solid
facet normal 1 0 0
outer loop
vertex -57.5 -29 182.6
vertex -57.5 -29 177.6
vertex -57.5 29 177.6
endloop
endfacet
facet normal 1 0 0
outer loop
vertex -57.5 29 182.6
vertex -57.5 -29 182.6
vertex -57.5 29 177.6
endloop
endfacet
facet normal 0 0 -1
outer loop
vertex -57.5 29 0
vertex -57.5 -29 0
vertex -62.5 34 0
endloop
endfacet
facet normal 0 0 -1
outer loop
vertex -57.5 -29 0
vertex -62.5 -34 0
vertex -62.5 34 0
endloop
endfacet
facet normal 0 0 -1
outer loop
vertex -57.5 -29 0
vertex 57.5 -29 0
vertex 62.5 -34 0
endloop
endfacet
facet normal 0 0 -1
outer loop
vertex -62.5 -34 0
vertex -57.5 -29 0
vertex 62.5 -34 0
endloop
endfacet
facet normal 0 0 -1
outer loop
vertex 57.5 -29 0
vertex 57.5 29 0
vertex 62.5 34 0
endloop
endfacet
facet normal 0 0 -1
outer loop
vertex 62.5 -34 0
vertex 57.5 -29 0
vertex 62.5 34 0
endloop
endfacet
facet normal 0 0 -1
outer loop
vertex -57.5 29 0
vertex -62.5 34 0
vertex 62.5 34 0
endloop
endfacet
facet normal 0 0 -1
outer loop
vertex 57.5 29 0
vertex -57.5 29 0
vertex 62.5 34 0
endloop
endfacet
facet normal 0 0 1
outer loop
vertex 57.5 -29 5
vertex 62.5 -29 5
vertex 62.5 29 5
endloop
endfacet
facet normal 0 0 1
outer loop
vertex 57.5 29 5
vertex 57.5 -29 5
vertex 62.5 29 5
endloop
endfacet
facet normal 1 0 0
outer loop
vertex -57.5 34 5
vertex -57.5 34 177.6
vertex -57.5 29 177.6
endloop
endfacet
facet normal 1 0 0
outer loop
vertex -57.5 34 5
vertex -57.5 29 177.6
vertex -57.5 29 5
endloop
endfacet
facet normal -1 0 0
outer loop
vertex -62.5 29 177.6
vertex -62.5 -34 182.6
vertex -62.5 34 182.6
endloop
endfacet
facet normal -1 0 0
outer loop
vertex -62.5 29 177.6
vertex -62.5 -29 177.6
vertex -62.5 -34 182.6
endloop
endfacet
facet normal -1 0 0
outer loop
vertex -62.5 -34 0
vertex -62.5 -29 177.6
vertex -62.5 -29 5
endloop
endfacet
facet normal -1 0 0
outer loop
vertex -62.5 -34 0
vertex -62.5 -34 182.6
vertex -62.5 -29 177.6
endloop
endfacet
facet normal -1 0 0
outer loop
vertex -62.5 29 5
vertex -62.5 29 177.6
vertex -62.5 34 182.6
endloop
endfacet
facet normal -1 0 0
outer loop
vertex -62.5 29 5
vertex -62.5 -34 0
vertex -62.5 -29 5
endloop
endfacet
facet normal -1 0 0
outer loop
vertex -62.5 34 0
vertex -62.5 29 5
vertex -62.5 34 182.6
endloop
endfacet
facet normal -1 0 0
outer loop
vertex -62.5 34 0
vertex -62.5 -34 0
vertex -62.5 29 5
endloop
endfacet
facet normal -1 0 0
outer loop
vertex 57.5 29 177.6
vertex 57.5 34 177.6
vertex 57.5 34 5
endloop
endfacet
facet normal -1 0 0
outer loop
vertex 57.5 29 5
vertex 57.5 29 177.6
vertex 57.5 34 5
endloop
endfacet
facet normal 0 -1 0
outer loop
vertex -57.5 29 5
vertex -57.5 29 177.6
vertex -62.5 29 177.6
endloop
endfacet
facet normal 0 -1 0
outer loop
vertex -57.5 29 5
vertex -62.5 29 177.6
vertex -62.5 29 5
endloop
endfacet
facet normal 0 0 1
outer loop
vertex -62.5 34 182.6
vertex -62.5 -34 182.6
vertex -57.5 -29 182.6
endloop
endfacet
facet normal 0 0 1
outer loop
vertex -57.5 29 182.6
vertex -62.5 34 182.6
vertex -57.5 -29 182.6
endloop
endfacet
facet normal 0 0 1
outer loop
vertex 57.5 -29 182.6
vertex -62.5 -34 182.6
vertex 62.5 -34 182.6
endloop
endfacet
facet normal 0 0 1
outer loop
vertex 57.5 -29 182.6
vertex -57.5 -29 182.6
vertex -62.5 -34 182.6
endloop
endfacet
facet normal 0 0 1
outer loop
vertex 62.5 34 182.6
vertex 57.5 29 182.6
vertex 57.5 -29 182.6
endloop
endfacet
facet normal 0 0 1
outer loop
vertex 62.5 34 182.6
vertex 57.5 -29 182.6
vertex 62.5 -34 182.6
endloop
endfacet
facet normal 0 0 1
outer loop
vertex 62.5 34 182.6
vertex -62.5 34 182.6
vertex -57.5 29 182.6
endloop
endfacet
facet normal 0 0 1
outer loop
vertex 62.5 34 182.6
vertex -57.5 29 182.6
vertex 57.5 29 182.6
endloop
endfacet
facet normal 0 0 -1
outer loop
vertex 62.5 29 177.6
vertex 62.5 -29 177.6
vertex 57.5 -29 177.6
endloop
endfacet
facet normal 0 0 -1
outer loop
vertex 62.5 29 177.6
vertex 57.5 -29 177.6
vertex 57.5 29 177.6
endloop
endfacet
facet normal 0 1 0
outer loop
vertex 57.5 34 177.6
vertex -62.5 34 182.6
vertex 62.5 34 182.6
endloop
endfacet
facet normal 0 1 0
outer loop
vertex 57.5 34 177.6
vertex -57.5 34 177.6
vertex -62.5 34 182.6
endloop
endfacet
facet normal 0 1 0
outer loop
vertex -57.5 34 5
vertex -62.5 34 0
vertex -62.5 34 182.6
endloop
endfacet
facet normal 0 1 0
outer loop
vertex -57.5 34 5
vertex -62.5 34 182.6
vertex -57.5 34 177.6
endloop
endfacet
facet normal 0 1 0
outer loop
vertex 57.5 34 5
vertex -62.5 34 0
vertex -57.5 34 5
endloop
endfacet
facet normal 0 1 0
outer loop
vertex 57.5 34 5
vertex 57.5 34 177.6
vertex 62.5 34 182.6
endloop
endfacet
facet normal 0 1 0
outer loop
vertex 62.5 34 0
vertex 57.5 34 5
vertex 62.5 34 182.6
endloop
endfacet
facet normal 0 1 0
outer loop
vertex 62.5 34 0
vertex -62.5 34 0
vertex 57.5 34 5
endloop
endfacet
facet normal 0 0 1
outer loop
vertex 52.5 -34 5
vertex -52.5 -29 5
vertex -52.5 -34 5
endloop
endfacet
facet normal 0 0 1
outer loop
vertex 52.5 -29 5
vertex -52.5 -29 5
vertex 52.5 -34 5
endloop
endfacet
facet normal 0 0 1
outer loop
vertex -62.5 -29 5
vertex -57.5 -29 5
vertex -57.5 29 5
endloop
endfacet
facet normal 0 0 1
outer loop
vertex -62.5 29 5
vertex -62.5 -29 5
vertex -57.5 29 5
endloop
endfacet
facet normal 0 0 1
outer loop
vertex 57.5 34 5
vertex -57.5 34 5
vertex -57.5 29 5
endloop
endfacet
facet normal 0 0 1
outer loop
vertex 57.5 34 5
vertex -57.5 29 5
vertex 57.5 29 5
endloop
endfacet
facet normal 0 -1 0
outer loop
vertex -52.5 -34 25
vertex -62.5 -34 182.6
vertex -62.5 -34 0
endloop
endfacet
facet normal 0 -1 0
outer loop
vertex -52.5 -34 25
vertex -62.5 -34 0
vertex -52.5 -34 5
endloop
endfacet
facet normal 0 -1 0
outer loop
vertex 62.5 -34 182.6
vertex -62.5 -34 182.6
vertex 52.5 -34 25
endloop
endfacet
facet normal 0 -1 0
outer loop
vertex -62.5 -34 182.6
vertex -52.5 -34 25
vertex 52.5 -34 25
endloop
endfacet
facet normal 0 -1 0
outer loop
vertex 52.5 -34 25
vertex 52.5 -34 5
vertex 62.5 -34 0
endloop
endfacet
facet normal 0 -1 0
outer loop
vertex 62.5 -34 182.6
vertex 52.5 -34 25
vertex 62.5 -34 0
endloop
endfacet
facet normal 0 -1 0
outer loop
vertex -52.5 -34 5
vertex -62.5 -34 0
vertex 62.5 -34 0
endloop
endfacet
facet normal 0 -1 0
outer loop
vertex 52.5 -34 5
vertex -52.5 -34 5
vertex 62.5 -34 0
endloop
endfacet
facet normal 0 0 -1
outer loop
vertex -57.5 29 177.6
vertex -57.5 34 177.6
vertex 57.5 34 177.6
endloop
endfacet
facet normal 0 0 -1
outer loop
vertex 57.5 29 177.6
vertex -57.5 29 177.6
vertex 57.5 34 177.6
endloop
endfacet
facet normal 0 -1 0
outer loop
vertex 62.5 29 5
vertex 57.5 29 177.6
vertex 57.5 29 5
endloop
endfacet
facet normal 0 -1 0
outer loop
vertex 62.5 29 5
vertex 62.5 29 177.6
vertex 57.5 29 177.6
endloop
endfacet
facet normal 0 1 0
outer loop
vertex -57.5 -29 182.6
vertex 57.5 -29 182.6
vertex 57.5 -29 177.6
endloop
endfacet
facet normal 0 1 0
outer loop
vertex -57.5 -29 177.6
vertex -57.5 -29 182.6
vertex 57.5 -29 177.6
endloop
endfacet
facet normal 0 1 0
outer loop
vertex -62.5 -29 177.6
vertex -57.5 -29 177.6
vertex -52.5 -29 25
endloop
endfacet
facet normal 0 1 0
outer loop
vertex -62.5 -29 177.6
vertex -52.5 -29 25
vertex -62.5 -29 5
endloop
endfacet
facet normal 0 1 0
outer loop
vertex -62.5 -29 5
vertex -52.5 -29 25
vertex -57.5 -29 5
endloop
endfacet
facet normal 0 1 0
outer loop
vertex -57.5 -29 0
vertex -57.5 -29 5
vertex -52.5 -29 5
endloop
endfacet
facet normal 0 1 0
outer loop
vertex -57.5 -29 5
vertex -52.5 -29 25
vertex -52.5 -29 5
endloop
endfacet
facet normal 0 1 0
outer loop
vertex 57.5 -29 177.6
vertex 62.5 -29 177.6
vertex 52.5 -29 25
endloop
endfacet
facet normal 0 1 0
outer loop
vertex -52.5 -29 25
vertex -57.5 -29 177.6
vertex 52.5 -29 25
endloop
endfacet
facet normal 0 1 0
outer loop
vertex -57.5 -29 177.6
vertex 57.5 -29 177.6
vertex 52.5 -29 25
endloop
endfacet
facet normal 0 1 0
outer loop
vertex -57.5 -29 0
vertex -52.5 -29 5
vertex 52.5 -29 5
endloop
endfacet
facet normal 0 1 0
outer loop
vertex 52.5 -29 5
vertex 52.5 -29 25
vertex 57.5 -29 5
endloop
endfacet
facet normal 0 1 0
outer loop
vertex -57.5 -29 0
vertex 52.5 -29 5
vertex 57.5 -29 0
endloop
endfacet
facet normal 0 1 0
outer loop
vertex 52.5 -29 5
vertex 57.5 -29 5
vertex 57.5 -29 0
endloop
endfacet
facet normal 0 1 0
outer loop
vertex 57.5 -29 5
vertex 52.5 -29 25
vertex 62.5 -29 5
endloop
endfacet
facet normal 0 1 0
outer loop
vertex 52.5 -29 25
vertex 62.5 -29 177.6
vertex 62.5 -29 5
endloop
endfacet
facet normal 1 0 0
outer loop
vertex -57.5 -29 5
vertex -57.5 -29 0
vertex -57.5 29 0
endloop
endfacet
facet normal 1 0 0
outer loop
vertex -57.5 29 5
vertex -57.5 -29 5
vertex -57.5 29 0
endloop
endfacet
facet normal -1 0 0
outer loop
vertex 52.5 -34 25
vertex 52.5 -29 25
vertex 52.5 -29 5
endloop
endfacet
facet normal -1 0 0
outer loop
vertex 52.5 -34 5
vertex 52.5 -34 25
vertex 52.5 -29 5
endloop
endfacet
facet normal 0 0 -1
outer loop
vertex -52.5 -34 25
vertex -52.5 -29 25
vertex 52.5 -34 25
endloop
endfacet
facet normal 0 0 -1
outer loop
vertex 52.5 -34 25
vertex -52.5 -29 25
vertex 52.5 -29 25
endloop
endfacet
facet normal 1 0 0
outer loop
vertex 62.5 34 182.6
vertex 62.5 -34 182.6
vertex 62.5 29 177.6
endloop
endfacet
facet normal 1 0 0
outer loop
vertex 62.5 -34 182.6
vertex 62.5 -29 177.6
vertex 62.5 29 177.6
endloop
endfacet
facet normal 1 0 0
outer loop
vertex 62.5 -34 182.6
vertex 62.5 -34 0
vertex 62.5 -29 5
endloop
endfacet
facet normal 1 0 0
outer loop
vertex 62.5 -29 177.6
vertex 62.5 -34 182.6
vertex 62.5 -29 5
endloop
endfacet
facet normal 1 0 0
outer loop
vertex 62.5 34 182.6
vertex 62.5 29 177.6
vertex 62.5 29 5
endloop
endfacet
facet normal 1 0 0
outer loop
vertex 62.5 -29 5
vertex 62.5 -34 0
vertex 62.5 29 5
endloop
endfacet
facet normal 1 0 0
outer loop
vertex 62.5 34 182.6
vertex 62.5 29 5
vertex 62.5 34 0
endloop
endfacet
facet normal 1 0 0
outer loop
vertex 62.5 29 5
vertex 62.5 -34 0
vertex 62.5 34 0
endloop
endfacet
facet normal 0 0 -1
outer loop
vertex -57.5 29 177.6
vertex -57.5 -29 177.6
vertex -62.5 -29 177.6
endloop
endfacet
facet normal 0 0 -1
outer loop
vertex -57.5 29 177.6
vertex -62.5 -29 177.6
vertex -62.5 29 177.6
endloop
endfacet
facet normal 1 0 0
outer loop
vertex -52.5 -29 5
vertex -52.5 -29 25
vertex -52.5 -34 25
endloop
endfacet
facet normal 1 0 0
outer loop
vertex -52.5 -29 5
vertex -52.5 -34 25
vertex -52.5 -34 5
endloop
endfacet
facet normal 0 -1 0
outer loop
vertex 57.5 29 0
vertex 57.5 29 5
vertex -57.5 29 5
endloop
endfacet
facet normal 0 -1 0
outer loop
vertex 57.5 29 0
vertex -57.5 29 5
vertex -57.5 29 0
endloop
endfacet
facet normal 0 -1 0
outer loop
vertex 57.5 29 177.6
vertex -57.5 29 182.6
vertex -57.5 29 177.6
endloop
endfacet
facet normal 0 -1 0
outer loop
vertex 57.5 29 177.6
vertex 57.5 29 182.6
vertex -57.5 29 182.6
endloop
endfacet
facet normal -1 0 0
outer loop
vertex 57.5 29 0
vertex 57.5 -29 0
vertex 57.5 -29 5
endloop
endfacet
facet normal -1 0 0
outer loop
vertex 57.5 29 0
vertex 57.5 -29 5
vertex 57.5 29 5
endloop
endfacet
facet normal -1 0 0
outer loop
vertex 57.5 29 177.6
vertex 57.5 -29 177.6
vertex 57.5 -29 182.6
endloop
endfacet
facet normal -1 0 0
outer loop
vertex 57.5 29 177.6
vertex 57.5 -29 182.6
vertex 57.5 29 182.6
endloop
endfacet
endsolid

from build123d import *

# Parameters (mm, degrees)
SKETCH1_W           = 125
SKETCH1_H           = 68
BOSS_EXTRUDE1_DEPTH = 182.6
SKETCH2_W           = 172.6
SKETCH2_H           = 58
CUT_EXTRUDE1_DEPTH  = 126
SKETCH3_W           = 115
SKETCH3_H           = 58
CUT_EXTRUDE2_DEPTH  = 183.6
SKETCH4_W           = 115
SKETCH4_H           = 172.6
CUT_EXTRUDE3_DEPTH  = 63
SKETCH5_W           = 105
SKETCH5_H           = 20
CUT_EXTRUDE4_DEPTH  = 6


with BuildPart() as part:
    # Sketch1 → Boss-Extrude1 (new body)
    with BuildSketch(Plane.XY):
        Rectangle(SKETCH1_W, SKETCH1_H)
    extrude(amount=BOSS_EXTRUDE1_DEPTH)

    # Sketch2 → Cut-Extrude1 (cut, through all)
    with BuildSketch(Plane(origin=(62.5, 0, 0), x_dir=(0, 0, -1), z_dir=(1, 0, 0))):
        with Locations((-91.3, 0)):
            Rectangle(SKETCH2_W, SKETCH2_H)
    extrude(amount=-CUT_EXTRUDE1_DEPTH, mode=Mode.SUBTRACT)

    # Sketch3 → Cut-Extrude2 (cut, through all)
    with BuildSketch(Plane(origin=(0, 0, 0), x_dir=(-1, 0, 0), z_dir=(0, 0, -1))):
        Rectangle(SKETCH3_W, SKETCH3_H)
    extrude(amount=-CUT_EXTRUDE2_DEPTH, mode=Mode.SUBTRACT)

    # Sketch4 → Cut-Extrude3 (cut)
    with BuildSketch(Plane(origin=(0, 34, 0), x_dir=(1, 0, 0), z_dir=(0, 1, 0))):
        with Locations((0, -91.3)):
            Rectangle(SKETCH4_W, SKETCH4_H)
    extrude(amount=-CUT_EXTRUDE3_DEPTH, mode=Mode.SUBTRACT)

    # Sketch5 → Cut-Extrude4 (cut, through all)
    with BuildSketch(Plane(origin=(0, -29, 0), x_dir=(1, 0, 0), z_dir=(0, 1, 0))):
        with Locations((0, -15)):
            Rectangle(SKETCH5_W, SKETCH5_H)
    extrude(amount=-CUT_EXTRUDE4_DEPTH, mode=Mode.SUBTRACT)


solid = part.part
